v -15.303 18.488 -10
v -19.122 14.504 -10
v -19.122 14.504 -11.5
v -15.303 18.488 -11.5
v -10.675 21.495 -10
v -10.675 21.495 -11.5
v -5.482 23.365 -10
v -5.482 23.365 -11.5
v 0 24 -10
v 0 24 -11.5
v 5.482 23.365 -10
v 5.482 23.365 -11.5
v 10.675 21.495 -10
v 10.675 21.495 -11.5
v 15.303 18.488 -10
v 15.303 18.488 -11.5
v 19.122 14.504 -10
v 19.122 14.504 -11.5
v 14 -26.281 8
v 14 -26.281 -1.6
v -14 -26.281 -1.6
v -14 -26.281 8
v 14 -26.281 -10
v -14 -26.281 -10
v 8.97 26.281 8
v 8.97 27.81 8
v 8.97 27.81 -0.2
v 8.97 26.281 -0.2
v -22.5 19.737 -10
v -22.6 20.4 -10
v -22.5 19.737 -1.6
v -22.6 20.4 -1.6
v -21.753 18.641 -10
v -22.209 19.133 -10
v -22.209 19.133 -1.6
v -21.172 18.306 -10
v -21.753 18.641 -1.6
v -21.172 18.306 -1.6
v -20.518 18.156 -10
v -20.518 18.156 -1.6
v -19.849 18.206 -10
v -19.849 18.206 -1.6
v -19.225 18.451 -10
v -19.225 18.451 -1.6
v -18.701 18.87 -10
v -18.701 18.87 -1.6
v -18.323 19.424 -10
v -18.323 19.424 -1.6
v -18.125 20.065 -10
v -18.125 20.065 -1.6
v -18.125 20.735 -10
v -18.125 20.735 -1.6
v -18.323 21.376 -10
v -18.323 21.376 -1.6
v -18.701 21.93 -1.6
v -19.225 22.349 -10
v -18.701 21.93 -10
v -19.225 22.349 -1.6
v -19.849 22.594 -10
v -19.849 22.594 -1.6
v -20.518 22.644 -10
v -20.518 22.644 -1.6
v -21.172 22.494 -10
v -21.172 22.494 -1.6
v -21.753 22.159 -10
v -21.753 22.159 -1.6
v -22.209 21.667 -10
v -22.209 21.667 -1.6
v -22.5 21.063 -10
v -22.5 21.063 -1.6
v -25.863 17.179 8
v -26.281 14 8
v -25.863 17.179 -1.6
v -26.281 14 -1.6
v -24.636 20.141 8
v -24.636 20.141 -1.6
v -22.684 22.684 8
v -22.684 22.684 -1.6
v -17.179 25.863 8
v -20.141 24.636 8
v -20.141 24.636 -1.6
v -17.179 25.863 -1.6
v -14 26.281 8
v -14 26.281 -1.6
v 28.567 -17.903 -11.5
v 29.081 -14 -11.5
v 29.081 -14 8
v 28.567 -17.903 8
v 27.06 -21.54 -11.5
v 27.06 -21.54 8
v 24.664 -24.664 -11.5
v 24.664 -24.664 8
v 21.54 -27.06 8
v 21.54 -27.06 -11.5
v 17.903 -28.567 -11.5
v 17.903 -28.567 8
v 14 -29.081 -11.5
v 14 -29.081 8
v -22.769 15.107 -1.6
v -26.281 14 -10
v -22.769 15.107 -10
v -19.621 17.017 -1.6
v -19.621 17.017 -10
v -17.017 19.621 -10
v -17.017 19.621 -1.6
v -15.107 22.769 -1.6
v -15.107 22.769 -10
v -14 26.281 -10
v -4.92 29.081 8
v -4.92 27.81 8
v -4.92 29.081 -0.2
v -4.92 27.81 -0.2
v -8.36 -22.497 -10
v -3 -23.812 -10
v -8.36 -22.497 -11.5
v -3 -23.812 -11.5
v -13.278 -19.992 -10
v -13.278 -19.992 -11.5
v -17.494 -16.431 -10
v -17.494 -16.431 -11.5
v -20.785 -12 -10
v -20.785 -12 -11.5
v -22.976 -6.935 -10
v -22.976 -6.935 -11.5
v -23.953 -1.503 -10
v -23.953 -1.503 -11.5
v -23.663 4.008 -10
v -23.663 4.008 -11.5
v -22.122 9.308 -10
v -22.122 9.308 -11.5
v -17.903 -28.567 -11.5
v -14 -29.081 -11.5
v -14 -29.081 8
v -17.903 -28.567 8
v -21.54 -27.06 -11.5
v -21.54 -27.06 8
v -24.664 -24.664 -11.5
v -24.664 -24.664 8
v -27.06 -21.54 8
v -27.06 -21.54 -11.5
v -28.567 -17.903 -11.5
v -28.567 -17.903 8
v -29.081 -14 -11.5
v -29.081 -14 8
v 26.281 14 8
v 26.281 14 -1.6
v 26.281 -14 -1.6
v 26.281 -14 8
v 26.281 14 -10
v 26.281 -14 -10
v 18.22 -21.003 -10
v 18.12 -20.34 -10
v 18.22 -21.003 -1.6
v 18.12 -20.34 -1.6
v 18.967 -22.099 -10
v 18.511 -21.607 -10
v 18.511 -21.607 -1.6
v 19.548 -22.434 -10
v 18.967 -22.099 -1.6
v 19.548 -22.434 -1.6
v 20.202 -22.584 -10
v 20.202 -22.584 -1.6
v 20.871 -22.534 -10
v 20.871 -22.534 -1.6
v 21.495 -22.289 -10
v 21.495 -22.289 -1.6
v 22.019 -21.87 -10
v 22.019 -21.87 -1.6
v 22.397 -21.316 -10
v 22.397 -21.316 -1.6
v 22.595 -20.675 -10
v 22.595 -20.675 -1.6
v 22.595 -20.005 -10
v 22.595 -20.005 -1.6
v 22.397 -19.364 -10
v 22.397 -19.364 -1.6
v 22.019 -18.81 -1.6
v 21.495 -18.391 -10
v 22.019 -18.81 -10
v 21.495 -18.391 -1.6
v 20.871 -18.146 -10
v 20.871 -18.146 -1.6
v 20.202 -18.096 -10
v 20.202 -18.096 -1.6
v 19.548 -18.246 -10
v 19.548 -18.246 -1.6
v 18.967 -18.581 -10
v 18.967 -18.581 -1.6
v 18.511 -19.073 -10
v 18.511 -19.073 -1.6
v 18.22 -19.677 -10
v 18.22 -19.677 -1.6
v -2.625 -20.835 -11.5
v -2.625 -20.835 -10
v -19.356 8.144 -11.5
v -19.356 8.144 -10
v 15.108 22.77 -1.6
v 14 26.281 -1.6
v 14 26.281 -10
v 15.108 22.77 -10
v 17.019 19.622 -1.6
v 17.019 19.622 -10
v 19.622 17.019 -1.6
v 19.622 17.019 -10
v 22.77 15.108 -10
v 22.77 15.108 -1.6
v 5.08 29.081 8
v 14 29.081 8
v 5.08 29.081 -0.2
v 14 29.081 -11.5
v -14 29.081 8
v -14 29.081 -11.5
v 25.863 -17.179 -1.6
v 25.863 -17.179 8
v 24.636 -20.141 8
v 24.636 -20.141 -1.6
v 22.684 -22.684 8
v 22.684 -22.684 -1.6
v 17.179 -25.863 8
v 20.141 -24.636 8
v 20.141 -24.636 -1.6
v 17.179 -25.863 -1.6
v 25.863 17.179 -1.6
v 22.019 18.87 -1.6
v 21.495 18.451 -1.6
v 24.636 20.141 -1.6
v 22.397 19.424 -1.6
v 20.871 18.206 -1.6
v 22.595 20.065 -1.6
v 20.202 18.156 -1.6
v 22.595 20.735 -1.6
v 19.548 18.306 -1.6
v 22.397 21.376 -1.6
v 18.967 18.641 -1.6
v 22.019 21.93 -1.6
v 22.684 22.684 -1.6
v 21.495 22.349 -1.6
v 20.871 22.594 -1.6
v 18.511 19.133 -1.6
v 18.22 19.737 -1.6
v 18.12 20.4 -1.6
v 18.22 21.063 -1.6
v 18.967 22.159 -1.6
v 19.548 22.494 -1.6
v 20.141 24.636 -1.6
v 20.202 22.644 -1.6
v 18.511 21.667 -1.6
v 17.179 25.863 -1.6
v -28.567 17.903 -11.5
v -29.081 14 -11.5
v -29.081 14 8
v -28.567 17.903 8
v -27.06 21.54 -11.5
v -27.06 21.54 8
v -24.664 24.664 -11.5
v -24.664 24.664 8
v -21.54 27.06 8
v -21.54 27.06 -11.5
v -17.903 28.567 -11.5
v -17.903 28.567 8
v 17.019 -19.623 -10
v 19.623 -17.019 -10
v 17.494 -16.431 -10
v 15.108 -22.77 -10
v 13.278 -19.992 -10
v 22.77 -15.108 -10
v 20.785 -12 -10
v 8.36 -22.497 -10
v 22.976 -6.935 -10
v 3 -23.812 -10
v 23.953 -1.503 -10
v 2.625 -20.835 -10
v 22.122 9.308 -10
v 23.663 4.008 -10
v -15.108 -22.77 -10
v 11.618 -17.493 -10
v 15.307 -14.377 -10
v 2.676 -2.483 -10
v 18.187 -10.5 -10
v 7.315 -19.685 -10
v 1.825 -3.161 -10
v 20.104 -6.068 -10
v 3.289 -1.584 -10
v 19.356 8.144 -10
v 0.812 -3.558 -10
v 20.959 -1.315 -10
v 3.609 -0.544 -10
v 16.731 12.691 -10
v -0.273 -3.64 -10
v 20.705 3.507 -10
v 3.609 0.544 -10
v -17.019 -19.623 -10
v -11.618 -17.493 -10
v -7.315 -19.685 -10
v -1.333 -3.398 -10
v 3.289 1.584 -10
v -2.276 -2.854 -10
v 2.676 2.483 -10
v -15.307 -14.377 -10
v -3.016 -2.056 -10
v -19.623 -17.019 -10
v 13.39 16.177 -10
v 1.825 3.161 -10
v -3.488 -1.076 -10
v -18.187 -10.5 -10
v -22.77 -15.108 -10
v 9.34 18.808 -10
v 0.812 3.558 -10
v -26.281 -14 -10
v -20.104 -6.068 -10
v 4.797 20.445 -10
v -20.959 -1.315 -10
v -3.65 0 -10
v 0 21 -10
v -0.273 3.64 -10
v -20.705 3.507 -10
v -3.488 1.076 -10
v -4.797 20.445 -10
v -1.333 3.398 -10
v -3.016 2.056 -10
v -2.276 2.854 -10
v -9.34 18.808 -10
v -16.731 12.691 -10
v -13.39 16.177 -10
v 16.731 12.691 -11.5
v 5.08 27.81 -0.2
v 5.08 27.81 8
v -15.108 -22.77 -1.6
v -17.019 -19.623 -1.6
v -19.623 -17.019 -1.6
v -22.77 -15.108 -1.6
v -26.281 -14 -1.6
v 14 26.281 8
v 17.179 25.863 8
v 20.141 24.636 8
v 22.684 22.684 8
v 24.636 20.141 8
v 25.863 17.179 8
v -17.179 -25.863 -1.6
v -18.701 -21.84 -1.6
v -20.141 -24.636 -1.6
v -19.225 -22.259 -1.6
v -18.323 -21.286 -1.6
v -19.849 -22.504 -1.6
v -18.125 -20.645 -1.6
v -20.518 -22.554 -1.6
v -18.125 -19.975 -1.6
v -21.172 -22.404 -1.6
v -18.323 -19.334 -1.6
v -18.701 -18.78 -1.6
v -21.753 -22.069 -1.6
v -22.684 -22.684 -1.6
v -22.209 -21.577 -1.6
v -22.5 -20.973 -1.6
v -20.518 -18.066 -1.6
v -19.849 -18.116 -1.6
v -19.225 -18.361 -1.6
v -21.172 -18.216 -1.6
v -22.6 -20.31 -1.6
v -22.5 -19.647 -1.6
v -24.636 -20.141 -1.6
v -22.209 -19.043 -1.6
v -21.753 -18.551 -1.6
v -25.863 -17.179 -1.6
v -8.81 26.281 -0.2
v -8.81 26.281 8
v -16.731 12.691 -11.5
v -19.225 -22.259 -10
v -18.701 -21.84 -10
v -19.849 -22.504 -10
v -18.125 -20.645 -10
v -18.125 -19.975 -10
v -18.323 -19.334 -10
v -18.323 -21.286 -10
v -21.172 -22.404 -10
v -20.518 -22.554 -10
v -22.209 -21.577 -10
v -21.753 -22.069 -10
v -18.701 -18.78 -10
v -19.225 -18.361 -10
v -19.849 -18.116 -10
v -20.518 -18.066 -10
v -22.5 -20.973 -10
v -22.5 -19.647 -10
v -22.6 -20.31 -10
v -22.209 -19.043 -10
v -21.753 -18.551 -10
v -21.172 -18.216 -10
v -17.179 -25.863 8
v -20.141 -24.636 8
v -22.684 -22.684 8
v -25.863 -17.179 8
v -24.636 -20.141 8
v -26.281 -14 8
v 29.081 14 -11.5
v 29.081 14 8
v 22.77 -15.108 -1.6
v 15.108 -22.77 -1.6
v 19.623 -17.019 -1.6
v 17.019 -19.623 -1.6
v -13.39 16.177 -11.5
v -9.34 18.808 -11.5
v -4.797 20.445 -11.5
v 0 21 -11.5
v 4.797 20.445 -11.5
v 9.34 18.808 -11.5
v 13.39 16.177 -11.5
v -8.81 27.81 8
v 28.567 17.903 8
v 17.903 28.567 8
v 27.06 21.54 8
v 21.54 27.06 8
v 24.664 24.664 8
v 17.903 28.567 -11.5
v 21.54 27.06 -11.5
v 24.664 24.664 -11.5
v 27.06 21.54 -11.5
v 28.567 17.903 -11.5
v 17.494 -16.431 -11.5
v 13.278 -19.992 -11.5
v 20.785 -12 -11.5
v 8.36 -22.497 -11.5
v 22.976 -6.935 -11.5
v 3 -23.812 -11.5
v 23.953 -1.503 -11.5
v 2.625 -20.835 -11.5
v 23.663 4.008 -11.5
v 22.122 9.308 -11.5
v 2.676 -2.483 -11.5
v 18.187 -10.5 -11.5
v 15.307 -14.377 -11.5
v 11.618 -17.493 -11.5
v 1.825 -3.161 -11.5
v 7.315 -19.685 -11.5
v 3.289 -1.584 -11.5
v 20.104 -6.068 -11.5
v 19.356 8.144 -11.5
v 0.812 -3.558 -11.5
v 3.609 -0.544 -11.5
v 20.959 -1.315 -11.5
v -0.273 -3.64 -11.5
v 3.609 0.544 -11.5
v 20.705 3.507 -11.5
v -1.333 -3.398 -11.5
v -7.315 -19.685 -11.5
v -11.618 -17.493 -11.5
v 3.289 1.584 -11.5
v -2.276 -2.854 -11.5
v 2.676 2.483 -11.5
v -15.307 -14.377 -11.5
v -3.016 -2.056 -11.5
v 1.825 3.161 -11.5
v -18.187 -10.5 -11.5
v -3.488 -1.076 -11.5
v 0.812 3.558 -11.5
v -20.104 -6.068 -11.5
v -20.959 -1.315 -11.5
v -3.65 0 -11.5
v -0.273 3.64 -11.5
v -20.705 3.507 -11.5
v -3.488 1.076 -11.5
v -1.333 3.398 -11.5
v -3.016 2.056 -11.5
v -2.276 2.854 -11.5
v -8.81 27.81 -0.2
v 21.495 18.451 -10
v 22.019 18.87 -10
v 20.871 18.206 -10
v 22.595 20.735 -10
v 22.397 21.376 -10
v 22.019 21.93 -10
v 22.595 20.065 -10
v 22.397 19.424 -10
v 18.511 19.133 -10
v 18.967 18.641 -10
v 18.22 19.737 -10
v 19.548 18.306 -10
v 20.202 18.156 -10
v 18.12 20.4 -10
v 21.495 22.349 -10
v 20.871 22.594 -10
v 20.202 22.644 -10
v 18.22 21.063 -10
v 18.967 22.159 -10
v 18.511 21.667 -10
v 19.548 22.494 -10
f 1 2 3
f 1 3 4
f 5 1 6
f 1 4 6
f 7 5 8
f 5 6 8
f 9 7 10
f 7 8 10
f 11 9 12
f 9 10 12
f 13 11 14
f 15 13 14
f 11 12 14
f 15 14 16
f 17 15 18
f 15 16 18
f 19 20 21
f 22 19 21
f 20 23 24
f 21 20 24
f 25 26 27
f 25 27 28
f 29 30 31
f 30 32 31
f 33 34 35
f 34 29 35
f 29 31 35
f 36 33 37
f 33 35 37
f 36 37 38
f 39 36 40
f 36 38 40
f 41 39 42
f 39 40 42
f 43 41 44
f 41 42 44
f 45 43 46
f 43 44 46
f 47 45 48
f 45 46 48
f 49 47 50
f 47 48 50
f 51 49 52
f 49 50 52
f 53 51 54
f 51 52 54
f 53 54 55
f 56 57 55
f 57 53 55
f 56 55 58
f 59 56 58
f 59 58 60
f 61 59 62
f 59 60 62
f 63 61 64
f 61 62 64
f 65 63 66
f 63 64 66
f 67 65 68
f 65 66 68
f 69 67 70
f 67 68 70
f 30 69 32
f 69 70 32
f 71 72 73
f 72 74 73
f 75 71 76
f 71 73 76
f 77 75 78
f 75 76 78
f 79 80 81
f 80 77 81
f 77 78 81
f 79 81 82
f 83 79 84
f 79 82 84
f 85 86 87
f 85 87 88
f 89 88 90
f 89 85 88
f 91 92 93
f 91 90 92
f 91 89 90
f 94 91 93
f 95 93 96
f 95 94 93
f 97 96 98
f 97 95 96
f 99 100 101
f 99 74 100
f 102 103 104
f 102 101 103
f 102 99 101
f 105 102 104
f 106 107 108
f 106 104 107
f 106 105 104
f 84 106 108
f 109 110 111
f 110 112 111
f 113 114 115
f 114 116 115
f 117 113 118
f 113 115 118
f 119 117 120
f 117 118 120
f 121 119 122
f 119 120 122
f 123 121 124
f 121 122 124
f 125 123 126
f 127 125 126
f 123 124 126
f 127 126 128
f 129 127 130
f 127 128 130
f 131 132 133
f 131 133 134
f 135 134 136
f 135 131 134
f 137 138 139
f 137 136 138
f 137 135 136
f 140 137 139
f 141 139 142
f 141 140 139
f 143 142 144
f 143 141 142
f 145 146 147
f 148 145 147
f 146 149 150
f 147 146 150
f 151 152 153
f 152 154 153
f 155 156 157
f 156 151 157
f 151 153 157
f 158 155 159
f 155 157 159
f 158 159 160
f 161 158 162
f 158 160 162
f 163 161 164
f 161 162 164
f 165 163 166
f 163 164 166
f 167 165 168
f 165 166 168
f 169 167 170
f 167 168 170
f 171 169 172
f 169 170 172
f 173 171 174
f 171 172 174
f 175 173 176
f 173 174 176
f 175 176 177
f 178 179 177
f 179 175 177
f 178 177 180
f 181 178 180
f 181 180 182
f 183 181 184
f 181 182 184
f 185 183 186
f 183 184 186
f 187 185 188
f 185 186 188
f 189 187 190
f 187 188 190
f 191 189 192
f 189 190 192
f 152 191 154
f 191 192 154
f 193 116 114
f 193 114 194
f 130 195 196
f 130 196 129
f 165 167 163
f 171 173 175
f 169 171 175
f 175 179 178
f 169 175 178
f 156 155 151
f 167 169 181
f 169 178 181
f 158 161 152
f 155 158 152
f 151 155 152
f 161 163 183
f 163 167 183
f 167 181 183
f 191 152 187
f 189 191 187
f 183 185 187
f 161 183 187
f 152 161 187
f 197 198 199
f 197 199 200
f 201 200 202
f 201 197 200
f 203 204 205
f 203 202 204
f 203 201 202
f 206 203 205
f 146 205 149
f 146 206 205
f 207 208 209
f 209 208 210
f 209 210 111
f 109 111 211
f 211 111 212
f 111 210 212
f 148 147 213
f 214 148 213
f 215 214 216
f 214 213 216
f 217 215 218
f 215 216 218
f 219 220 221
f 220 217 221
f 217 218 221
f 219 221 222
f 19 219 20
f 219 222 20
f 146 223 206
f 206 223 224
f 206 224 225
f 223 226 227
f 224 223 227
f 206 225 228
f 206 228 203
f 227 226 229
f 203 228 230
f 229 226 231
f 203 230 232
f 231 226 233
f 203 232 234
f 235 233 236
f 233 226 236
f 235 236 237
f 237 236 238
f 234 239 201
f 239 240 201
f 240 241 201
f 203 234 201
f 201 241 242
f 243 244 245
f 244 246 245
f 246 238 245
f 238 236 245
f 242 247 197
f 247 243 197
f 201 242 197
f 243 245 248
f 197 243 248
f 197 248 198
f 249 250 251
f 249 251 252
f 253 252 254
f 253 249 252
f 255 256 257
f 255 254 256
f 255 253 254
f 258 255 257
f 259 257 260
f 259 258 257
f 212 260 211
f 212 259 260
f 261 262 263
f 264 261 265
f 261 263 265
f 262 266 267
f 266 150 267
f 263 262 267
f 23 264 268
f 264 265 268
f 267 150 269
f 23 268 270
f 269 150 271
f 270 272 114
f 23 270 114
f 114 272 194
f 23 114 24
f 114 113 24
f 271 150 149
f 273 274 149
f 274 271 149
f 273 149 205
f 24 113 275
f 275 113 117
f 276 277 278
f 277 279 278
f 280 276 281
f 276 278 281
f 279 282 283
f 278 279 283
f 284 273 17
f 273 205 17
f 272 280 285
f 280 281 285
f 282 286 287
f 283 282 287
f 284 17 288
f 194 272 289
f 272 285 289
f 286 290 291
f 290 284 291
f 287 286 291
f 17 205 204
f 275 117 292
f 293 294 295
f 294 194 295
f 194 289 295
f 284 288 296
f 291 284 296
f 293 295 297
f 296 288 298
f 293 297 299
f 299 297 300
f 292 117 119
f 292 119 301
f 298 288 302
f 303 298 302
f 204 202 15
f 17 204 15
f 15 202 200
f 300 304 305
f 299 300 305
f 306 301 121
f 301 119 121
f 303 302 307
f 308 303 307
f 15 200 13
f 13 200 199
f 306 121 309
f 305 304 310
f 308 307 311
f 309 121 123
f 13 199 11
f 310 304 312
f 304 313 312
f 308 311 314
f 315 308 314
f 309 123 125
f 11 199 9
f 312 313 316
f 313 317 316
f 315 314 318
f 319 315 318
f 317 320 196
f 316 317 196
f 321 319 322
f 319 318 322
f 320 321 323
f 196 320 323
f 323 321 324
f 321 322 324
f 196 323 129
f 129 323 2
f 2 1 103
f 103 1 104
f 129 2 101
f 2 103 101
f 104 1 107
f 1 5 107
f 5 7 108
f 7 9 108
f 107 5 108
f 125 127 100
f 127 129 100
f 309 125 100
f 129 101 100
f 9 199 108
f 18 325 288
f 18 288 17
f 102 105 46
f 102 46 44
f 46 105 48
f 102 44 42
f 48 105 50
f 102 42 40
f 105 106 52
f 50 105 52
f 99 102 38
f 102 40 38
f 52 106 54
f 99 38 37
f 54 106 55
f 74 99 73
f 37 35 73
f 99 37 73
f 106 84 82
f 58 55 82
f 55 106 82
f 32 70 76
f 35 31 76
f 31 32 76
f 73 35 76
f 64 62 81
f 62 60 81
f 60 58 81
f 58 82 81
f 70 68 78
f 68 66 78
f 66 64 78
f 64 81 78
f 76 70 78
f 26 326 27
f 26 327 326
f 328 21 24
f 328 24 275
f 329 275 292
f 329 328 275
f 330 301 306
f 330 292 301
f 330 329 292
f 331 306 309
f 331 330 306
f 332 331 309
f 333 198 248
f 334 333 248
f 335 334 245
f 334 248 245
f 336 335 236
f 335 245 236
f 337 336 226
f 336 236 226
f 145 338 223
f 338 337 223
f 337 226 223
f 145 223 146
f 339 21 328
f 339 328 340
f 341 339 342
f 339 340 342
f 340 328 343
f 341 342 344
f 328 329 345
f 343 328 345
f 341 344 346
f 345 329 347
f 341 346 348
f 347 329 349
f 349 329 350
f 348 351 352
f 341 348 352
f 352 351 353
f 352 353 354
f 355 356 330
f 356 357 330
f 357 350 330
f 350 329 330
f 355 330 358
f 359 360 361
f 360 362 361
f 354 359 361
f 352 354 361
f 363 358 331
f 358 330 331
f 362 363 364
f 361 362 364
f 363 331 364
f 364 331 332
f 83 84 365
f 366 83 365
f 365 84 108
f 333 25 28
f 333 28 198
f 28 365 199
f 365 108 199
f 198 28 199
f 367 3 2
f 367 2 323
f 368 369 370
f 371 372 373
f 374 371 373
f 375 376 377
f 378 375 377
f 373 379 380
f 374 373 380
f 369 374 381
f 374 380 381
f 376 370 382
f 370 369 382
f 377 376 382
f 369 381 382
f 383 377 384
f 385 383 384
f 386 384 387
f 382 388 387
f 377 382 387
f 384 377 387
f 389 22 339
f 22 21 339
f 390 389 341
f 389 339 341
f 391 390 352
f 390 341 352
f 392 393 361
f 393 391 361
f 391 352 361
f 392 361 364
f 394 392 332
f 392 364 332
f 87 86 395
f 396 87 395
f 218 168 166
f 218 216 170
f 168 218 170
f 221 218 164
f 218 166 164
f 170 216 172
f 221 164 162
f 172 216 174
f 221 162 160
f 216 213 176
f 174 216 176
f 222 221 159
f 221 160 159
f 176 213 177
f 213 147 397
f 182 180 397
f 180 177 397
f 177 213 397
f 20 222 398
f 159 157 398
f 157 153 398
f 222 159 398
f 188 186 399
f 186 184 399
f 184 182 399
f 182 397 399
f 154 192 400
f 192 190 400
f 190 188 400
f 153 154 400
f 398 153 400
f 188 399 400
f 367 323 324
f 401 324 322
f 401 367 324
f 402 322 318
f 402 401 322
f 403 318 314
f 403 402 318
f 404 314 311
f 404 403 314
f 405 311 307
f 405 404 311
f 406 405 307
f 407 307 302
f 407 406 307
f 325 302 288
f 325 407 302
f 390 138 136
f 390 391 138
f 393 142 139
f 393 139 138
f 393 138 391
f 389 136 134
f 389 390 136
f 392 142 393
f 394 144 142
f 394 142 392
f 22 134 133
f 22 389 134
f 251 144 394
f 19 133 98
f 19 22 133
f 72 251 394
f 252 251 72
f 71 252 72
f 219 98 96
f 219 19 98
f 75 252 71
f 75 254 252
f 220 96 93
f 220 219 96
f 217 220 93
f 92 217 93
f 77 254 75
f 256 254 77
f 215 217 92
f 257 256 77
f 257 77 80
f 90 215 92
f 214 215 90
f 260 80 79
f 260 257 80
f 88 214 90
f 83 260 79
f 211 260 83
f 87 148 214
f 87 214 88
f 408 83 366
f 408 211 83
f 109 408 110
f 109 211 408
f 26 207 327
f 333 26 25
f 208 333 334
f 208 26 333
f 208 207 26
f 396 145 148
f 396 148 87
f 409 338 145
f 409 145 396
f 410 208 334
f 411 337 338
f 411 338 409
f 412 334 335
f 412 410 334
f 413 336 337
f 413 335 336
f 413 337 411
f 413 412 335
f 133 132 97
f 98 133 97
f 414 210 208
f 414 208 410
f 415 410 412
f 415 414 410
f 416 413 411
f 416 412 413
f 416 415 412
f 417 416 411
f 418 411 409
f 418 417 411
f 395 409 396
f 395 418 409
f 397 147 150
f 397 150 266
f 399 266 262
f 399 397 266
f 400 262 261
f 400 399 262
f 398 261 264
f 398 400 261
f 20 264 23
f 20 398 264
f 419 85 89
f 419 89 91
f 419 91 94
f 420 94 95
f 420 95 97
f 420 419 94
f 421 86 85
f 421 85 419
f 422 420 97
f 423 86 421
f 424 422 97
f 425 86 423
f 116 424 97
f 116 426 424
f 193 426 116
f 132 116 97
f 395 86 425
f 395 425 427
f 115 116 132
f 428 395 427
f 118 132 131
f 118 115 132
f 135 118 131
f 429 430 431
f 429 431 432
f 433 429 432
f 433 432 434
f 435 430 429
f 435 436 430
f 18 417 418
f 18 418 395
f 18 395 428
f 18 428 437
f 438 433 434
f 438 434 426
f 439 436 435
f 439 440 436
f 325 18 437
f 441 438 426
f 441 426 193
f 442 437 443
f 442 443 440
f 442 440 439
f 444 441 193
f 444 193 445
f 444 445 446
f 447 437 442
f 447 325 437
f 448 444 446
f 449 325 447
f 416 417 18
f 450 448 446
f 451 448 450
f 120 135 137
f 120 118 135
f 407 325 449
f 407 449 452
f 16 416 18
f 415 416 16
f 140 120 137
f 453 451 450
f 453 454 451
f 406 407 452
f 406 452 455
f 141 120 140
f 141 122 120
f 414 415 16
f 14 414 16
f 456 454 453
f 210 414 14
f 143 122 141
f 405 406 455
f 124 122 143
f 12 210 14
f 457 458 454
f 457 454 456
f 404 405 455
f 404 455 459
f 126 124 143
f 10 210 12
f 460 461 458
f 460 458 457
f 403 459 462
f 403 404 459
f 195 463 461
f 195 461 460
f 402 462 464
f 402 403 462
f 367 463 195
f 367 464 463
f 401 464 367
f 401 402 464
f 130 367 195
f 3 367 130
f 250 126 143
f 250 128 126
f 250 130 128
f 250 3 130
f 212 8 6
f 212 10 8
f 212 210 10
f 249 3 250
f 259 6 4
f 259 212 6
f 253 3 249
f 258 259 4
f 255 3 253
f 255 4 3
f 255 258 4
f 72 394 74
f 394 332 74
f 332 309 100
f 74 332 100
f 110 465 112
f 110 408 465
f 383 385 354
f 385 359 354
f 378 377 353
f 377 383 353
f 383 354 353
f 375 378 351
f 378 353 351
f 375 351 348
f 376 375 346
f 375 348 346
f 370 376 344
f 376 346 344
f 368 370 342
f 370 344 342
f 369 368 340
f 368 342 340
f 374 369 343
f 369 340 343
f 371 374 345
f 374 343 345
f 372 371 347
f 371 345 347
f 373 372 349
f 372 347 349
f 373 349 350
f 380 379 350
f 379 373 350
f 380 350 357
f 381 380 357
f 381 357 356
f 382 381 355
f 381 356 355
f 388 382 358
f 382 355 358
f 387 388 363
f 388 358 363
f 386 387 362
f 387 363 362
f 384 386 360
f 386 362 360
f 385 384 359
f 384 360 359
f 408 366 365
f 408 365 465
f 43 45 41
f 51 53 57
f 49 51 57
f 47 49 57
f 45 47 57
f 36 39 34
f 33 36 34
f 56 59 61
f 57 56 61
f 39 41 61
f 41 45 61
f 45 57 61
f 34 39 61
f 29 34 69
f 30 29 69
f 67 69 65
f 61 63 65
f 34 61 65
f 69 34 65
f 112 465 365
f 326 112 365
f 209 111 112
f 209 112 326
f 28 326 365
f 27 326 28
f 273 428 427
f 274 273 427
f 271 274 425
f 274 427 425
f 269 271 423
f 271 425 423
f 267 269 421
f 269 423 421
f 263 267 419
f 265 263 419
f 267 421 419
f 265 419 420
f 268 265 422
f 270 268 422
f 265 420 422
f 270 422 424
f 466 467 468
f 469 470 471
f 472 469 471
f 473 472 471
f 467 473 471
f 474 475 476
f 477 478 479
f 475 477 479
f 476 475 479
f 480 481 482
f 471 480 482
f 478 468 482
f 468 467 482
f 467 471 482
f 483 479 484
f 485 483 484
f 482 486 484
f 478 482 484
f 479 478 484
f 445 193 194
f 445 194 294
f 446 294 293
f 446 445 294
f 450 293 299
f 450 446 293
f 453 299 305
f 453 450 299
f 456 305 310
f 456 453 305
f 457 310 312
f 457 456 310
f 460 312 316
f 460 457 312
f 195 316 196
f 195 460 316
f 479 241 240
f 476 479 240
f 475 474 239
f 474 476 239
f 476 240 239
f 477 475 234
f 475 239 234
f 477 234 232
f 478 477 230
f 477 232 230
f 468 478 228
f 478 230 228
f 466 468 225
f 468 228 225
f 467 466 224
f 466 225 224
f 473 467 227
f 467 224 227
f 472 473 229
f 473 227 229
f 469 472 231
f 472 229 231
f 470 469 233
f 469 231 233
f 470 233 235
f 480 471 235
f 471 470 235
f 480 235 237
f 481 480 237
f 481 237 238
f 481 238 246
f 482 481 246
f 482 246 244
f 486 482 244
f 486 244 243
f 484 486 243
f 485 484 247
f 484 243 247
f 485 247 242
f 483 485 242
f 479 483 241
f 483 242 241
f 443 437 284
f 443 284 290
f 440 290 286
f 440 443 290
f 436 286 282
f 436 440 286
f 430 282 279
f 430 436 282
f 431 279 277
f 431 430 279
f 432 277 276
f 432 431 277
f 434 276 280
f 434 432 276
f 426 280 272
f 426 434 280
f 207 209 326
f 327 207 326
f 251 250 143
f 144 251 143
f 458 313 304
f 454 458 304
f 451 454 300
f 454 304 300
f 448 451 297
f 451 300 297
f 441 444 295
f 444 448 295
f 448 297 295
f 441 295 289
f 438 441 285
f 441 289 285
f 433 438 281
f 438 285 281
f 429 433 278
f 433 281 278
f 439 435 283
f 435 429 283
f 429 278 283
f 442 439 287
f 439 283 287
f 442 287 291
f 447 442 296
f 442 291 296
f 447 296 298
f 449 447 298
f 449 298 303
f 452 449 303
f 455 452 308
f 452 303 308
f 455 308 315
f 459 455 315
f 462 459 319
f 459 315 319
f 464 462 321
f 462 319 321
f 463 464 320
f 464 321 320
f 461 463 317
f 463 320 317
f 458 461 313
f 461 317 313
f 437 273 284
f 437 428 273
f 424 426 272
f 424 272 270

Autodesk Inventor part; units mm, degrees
ref_plane "YZ Plane" through (0, 0, 0) normal (1, 0, 0) x (0, 1, 0)
ref_plane "XZ Plane" through (0, 0, 0) normal (0, 1, 0) x (-1, 0, 0)
ref_plane "XY Plane" through (0, 0, 0) normal (0, 0, 1) x (1, 0, 0)
sketch "Skizze1" plane through (0, 0, 0) normal (0, 0, 1) x (1, 0, 0)
  line L0 (-26, -14) -> (-26, 14)
  arc A0 (-14, 26) -> (-26, 14) centre (-14, 14) ccw
  line L1 (-14, 26) -> (14, 26)
  arc A1 (26, 14) -> (14, 26) centre (14, 14) ccw
  line L2 (26, 14) -> (26, -14)
  arc A2 (14, -26) -> (26, -14) centre (14, -14) ccw
  line L3 (14, -26) -> (-14, -26)
  arc A3 (-26, -14) -> (-14, -26) centre (-14, -14) ccw
  circle A4 centre (-7.42, 8.73) radius 0.55
  circle A5 centre (-7.42, 11.27) radius 0.55
  circle A6 centre (-3, 10.4) radius 0.4
  circle A7 centre (7.82, 11.27) radius 0.55
  circle A8 centre (7.82, 8.73) radius 0.55
  circle A9 centre (-2.5, 7) radius 0.5
  circle A10 centre (-7.42, 6.19) radius 0.55
  circle A11 centre (7.82, 6.19) radius 0.55
  circle A12 centre (2.5, 7) radius 0.5
  circle A13 centre (-7.42, 3.65) radius 0.55
  circle A14 centre (7.82, 3.65) radius 0.55
  circle A15 centre (0, -7.5) radius 0.5
  circle A16 centre (-2.5, -7.5) radius 0.5
  circle A17 centre (-7.42, -3.97) radius 0.55
  circle A18 centre (2.5, -7.5) radius 0.5
  circle A19 centre (-7.42, 1.11) radius 0.55
  circle A20 centre (-7.42, -1.43) radius 0.55
  circle A21 centre (7.82, -1.43) radius 0.55
  circle A22 centre (7.82, -3.97) radius 0.55
  circle A23 centre (7.82, 1.11) radius 0.55
  circle A24 centre (7.82, 23.97) radius 0.55
  circle A25 centre (7.82, 21.43) radius 0.55
  circle A26 centre (-7.42, 21.43) radius 0.55
  circle A27 centre (-3, 20.56) radius 0.4
  circle A28 centre (-7.42, 23.97) radius 0.55
  circle A29 centre (-7.42, 16.35) radius 0.55
  circle A30 centre (-7.42, 18.89) radius 0.55
  circle A31 centre (7.82, 18.89) radius 0.55
  circle A32 centre (7.82, 16.35) radius 0.55
  circle A33 centre (7.82, 13.81) radius 0.55
  circle A34 centre (-7.42, 13.81) radius 0.55
  circle A35 centre (20.37, 20.4) radius 1.6
  circle A36 centre (20.37, -20.34) radius 1.6
  circle A37 centre (-20.35, -20.31) radius 1.6
  circle A38 centre (-20.35, 20.4) radius 1.6
  line L4 (14, 29.080663) -> (-14, 29.080663)
  arc A39 (-14, 29.080663) -> (-29.080663, 14) centre (-14, 14) ccw
  line L5 (-29.080663, 14) -> (-29.080663, -14)
  arc A40 (-29.080663, -14) -> (-14, -29.080663) centre (-14, -14) ccw
  line L6 (-14, -29.080663) -> (14, -29.080663)
  arc A41 (14, -29.080663) -> (29.080663, -14) centre (14, -14) ccw
  line L7 (29.080663, -14) -> (29.080663, 14)
  arc A42 (29.080663, 14) -> (14, 29.080663) centre (14, 14) ccw
  line L8 (-14, -26.281068) -> (14, -26.281068)
  arc A43 (14, -26.281068) -> (26.281068, -14) centre (14, -14) ccw
  line L9 (26.281068, -14) -> (26.281068, 14)
  arc A44 (26.281068, 14) -> (14, 26.281068) centre (14, 14) ccw
  line L10 (14, 26.281068) -> (-14, 26.281068)
  arc A45 (-14, 26.281068) -> (-26.281068, 14) centre (-14, 14) ccw
  line L11 (-26.281068, 14) -> (-26.281068, -14)
  arc A46 (-26.281068, -14) -> (-14, -26.281068) centre (-14, -14) ccw
  point P0 (0, 0)
extrude "Extrusion1" add sketch "Skizze1" against normal blind 10 contours A42 L7 A41 L6 A40 L5 A39 L4
ref_plane "Arbeitsebene1" through (0, 0, -1.6) normal (0, 0, -1) x (-1, 0, 0)
sketch "Skizze3 outline for Extrusion2" plane through (0, 0, -1.6) normal (0, 0, -1) x (-1, 0, 0)
  arc A0 (26.281068, -14) -> (14, -26.281068) centre (29.125158, -29.125158) ccw
  arc A1 (14, -26.281068) -> (26.281068, -14) centre (14, -14) ccw
  circle A2 centre (20.35, -20.31) radius 2.25
  arc A3 (-26.281068, -14) -> (-14, -26.281068) centre (-14, -14) ccw
  arc A4 (-14, -26.281068) -> (-26.281068, -14) centre (-29.125083, -29.125083) ccw
  circle A5 centre (-20.37, -20.34) radius 2.25
  arc A6 (-26.281068, 14) -> (-14, 26.281068) centre (-29.124991, 29.124991) ccw
  arc A7 (-14, 26.281068) -> (-26.281068, 14) centre (-14, 14) ccw
  circle A8 centre (-20.37, 20.4) radius 2.25
  arc A9 (14, 26.281068) -> (26.281068, 14) centre (29.114115, 29.114115) ccw
  arc A10 (26.281068, 14) -> (14, 26.281068) centre (14, 14) ccw
  circle A11 centre (20.35, 20.4) radius 2.25
extrude "Extrusion2" add sketch "Skizze3 outline for Extrusion2" along normal up to surface (8.4 mm away)
sketch "Skizze2" plane through (0, 0, -10) normal (0, 0, -1) x (-1, 0, 0)
  line L0 (14, 29.080663) -> (-14, 29.080663)
  arc A0 (-14, 29.080663) -> (-29.080663, 14) centre (-14, 14) ccw
  line L1 (-29.080663, 14) -> (-29.080663, -14)
  arc A1 (-29.080663, -14) -> (-14, -29.080663) centre (-14, -14) ccw
  line L2 (-14, -29.080663) -> (14, -29.080663)
  arc A2 (14, -29.080663) -> (29.080663, -14) centre (14, -14) ccw
  line L3 (29.080663, -14) -> (29.080663, 14)
  arc A3 (29.080663, 14) -> (14, 29.080663) centre (14, 14) ccw
  circle A4 centre (0, 0) radius 3.5
  circle A5 centre (0, 0) radius 3.5
  circle A6 centre (0, 0) radius 3.65
  point P0 (0, 0)
  dimension "d12" = 0.15
extrude "Extrusion3" add sketch "Skizze2" along normal blind 1.5 contours A3 L3 A2 L2 A1 L1 A0 L0
sketch "Skizze4" plane through (0, 0, 0) normal (0, 0, 1) x (1, 0, 0)
  line L0 (14, 29.080663) -> (-14, 29.080663)
  arc A0 (-14, 29.080663) -> (-29.080663, 14) centre (-14, 14) ccw
  line L1 (-29.080663, 14) -> (-29.080663, -14)
  arc A1 (-29.080663, -14) -> (-14, -29.080663) centre (-14, -14) ccw
  line L2 (-14, -29.080663) -> (14, -29.080663)
  arc A2 (14, -29.080663) -> (29.080663, -14) centre (14, -14) ccw
  line L3 (29.080663, -14) -> (29.080663, 14)
  arc A3 (29.080663, 14) -> (14, 29.080663) centre (14, 14) ccw
  arc A4 (14, -26.281068) -> (26.281068, -14) centre (14, -14) ccw
  line L4 (14, -26.281068) -> (-14, -26.281068)
  arc A5 (-26.281068, -14) -> (-14, -26.281068) centre (-14, -14) ccw
  line L5 (-26.281068, -14) -> (-26.281068, 14)
  arc A6 (-14, 26.281068) -> (-26.281068, 14) centre (-14, 14) ccw
  line L6 (-14, 26.281068) -> (14, 26.281068)
  arc A7 (26.281068, 14) -> (14, 26.281068) centre (14, 14) ccw
  line L7 (26.281068, 14) -> (26.281068, -14)
  line L8 (14, 29.080663) -> (-14, 29.080663)
  arc A8 (-14, 29.080663) -> (-29.080663, 14) centre (-14, 14) ccw
  line L9 (-29.080663, 14) -> (-29.080663, -14)
  arc A9 (-29.080663, -14) -> (-14, -29.080663) centre (-14, -14) ccw
  line L10 (-14, -29.080663) -> (14, -29.080663)
  arc A10 (14, -29.080663) -> (29.080663, -14) centre (14, -14) ccw
  line L11 (29.080663, -14) -> (29.080663, 14)
  arc A11 (29.080663, 14) -> (14, 29.080663) centre (14, 14) ccw
  point P0 (0, 0)
extrude "Extrusion4" add sketch "Skizze4" along normal blind 1.5
sketch "Skizze5" plane through (0, 0, 1.5) normal (0, 0, 1) x (1, 0, 0)
  line L0 (-3.62, 24.2) -> (-3.62, 28.75)
  line L1 (3.78, 24.2) -> (3.78, 28.75)
  line L2 (-3.62, 28.75) -> (-3.62, 29.080663)
  line L3 (14, 29.080663) -> (-14, 29.080663)
  line L4 (3.78, 28.75) -> (3.78, 29.080663)
  line L5 (3.78, 29.080663) -> (-3.62, 29.080663)
  line L6 (-14, 26) -> (14, 26)
  line L7 (-3.62, 26) -> (3.78, 26)
  line L8 (14, 29.080663) -> (-14, 29.080663)
  arc A0 (-14, 29.080663) -> (-29.080663, 14) centre (-14, 14) ccw
  line L9 (-29.080663, 14) -> (-29.080663, -14)
  arc A1 (-29.080663, -14) -> (-14, -29.080663) centre (-14, -14) ccw
  line L10 (-14, -29.080663) -> (14, -29.080663)
  arc A2 (14, -29.080663) -> (29.080663, -14) centre (14, -14) ccw
  line L11 (29.080663, -14) -> (29.080663, 14)
  arc A3 (29.080663, 14) -> (14, 29.080663) centre (14, 14) ccw
  line L12 (-4.92, 29.080663) -> (5.08, 29.080663)
  line L13 (5.08, 29.080663) -> (5.08, 26)
  line L14 (5.08, 26) -> (-4.92, 26)
  line L15 (-4.92, 26) -> (-4.92, 29.080663)
  line L16 (14, -26.281068) -> (-14, -26.281068)
  arc A4 (-26.281068, -14) -> (-14, -26.281068) centre (-14, -14) ccw
  line L17 (-26.281068, -14) -> (-26.281068, 14)
  arc A5 (-14, 26.281068) -> (-26.281068, 14) centre (-14, 14) ccw
  line L18 (-14, 26.281068) -> (14, 26.281068)
  arc A6 (26.281068, 14) -> (14, 26.281068) centre (14, 14) ccw
  line L19 (26.281068, 14) -> (26.281068, -14)
  arc A7 (14, -26.281068) -> (26.281068, -14) centre (14, -14) ccw
  line L20 (14, 29.080663) -> (-14, 29.080663)
  arc A8 (-14, 29.080663) -> (-29.080663, 14) centre (-14, 14) ccw
  line L21 (-29.080663, 14) -> (-29.080663, -14)
  arc A9 (-29.080663, -14) -> (-14, -29.080663) centre (-14, -14) ccw
  line L22 (-14, -29.080663) -> (14, -29.080663)
  arc A10 (14, -29.080663) -> (29.080663, -14) centre (14, -14) ccw
  line L23 (29.080663, -14) -> (29.080663, 14)
  arc A11 (29.080663, 14) -> (14, 29.080663) centre (14, 14) ccw
  point P0 (0, 0)
  point P1 (-4.12, 26)
  point P2 (-4.12, 29.080663)
  point P3 (4.28, 26)
  point P4 (4.28, 29.080663)
  dimension "d36" = 10
extrude "Extrusion5" add sketch "Skizze5" along normal blind 8 contours L18 A5 L17 A4 L16 A7 L19 A6 L13 L3 A3 L11 A2 L10 A1 L9 A0 L15
sketch "Skizze6" plane through (0, 0, 9.5) normal (0, 0, 1) x (1, 0, 0)
  line L0 (8.97, 27.81) -> (8.97, -5.21)
  line L1 (-8.81, 27.81) -> (8.97, 27.81)
  line L2 (-8.81, -5.21) -> (-8.81, 27.81)
  line L3 (8.97, -5.21) -> (-8.81, -5.21)
  circle A0 centre (-7.55, -3.94) radius 0.530308
  circle A1 centre (-7.55, -1.4) radius 0.530308
  circle A2 centre (-7.55, 1.14) radius 0.530308
  circle A3 centre (-7.55, 3.68) radius 0.530308
  circle A4 centre (-7.55, 6.22) radius 0.530308
  circle A5 centre (-7.55, 8.76) radius 0.530308
  circle A6 centre (-7.55, 11.3) radius 0.530308
  circle A7 centre (-7.55, 13.84) radius 0.530308
  circle A8 centre (-7.55, 16.38) radius 0.530308
  circle A9 centre (-7.55, 18.92) radius 0.530308
  circle A10 centre (-7.55, 21.46) radius 0.530308
  circle A11 centre (-7.55, 24) radius 0.530308
  circle A12 centre (7.7, -3.94) radius 0.530308
  circle A13 centre (7.7, -1.4) radius 0.530308
  circle A14 centre (7.7, 1.14) radius 0.530308
  circle A15 centre (7.7, 3.68) radius 0.530308
  circle A16 centre (7.7, 6.22) radius 0.530308
  circle A17 centre (7.7, 8.76) radius 0.530308
  circle A18 centre (7.7, 11.3) radius 0.530308
  circle A19 centre (7.7, 13.84) radius 0.530308
  circle A20 centre (7.7, 16.38) radius 0.530308
  circle A21 centre (7.7, 18.92) radius 0.530308
  circle A22 centre (7.7, 21.46) radius 0.530308
  circle A23 centre (7.7, 24) radius 0.530308
  point P0 (0, 0)
extrude "Extrusion6" cut sketch "Skizze6" against normal up to surface (8 mm away)
sketch "Skizze7" plane through (0, 0, -11.5) normal (0, 0, -1) x (-1, 0, 0)
  circle A0 centre (0, 0) radius 22.5
  circle A1 centre (0, 0) radius 24
  circle A2 centre (0, 0) radius 21
  dimension "d23" = 45
  dimension "d24" = 1.5
  dimension "d25" = 1.5
extrude "Extrusion7" cut sketch "Skizze7" against normal blind 5.75 contours A0 | A1
sketch "Skizze8" plane through (0, 0, -11.5) normal (0, 0, -1) x (-1, 0, 0)
  circle A0 centre (8, -21) radius 1.666667
  circle A1 centre (-8, -21) radius 1.666667
  circle A2 centre (-20, -10.4) radius 1.666667
  circle A3 centre (-21.8, 5.5) radius 1.666667
  circle A4 centre (19.9, -10.4) radius 1.666667
  circle A5 centre (21.8, 5.5) radius 1.666667
  circle A6 centre (12.7, 18.6) radius 1.666667
  circle A7 centre (-12.7, 18.6) radius 1.666667
  line L0 (14, 29.080663) -> (-14, 29.080663)
  arc A8 (-14, 29.080663) -> (-29.080663, 14) centre (-14, 14) ccw
  line L1 (-29.080663, 14) -> (-29.080663, -14)
  arc A9 (-29.080663, -14) -> (-14, -29.080663) centre (-14, -14) ccw
  line L2 (-14, -29.080663) -> (14, -29.080663)
  arc A10 (14, -29.080663) -> (29.080663, -14) centre (14, -14) ccw
  line L3 (29.080663, -14) -> (29.080663, 14)
  arc A11 (29.080663, 14) -> (14, 29.080663) centre (14, 14) ccw
  circle A12 centre (0, 0) radius 24
  circle A13 centre (0, 0) radius 21
  line L4 (3, -23.811762) -> (2.625, -20.835292)
  circle A14 centre (0, 0) radius 21
  line L5 (0, -24) -> (0, -21)
  line L6 (-2.625, -20.835292) -> (-3, -23.811762)
  circle A15 centre (0, 0) radius 24
  dimension "d29" = 3
  dimension "d30" = 3
extrude "Extrusion8" add sketch "Skizze8" against normal up to surface (1.5 mm away) contours L4 A12 L5 A13 | L5 A12 L6 A13
pattern_circular "Runde Anordnung1" count 3 over 360 about axis through (0, 0, -11.5) along (0, 0, 1) of "Extrusion8"
sketch "Skizze9" plane through (0, 0, 1.5) normal (0, 0, 1) x (1, 0, 0)
  line L0 (5.08, 27.81) -> (5.08, 29.080663)
  line L1 (5.08, 29.080663) -> (-4.92, 29.080663)
  line L2 (-4.92, 29.080663) -> (-4.92, 27.81)
  line L3 (-8.81, 27.81) -> (-4.92, 27.81)
  line L4 (-8.81, 26.281068) -> (-8.81, 27.81)
  line L5 (-8.81, 26.281068) -> (8.97, 26.281068)
  line L6 (8.97, 27.81) -> (8.97, 26.281068)
  line L7 (5.08, 27.81) -> (8.97, 27.81)
  point P0 (0, 0)
extrude "Extrusion9" cut sketch "Skizze9" against normal blind 1.7
sketch "Skizze10" plane through (0, 0, 9.5) normal (0, 0, 1) x (1, 0, 0)
  line L0 (8.97, 27.81) -> (8.97, 26.281068)
  line L1 (8.97, 26.281068) -> (14, 26.281068)
  arc A0 (26.281068, 14) -> (14, 26.281068) centre (14, 14) ccw
  line L2 (26.281068, 14) -> (26.281068, -14)
  arc A1 (14, -26.281068) -> (26.281068, -14) centre (14, -14) ccw
  line L3 (14, -26.281068) -> (-14, -26.281068)
  arc A2 (-26.281068, -14) -> (-14, -26.281068) centre (-14, -14) ccw
  line L4 (-26.281068, -14) -> (-26.281068, 14)
  arc A3 (-14, 26.281068) -> (-26.281068, 14) centre (-14, 14) ccw
  line L5 (-14, 26.281068) -> (-8.81, 26.281068)
  line L6 (-8.81, 26.281068) -> (-8.81, 27.81)
  line L7 (-8.81, 27.81) -> (-4.92, 27.81)
  line L8 (-4.92, 27.81) -> (-4.92, 29.080663)
  line L9 (-4.92, 29.080663) -> (-14, 29.080663)
  arc A4 (-14, 29.080663) -> (-29.080663, 14) centre (-14, 14) ccw
  line L10 (-29.080663, 14) -> (-29.080663, -14)
  arc A5 (-29.080663, -14) -> (-14, -29.080663) centre (-14, -14) ccw
  line L11 (-14, -29.080663) -> (14, -29.080663)
  arc A6 (14, -29.080663) -> (29.080663, -14) centre (14, -14) ccw
  line L12 (29.080663, -14) -> (29.080663, 14)
  arc A7 (29.080663, 14) -> (14, 29.080663) centre (14, 14) ccw
  line L13 (14, 29.080663) -> (5.08, 29.080663)
  line L14 (5.08, 29.080663) -> (5.08, 27.81)
  line L15 (5.08, 27.81) -> (8.97, 27.81)
  point P0 (0, 0)
extrude "Extrusion10" cut sketch "Skizze10" against normal blind 1.5
properties part number "Oberbau"
